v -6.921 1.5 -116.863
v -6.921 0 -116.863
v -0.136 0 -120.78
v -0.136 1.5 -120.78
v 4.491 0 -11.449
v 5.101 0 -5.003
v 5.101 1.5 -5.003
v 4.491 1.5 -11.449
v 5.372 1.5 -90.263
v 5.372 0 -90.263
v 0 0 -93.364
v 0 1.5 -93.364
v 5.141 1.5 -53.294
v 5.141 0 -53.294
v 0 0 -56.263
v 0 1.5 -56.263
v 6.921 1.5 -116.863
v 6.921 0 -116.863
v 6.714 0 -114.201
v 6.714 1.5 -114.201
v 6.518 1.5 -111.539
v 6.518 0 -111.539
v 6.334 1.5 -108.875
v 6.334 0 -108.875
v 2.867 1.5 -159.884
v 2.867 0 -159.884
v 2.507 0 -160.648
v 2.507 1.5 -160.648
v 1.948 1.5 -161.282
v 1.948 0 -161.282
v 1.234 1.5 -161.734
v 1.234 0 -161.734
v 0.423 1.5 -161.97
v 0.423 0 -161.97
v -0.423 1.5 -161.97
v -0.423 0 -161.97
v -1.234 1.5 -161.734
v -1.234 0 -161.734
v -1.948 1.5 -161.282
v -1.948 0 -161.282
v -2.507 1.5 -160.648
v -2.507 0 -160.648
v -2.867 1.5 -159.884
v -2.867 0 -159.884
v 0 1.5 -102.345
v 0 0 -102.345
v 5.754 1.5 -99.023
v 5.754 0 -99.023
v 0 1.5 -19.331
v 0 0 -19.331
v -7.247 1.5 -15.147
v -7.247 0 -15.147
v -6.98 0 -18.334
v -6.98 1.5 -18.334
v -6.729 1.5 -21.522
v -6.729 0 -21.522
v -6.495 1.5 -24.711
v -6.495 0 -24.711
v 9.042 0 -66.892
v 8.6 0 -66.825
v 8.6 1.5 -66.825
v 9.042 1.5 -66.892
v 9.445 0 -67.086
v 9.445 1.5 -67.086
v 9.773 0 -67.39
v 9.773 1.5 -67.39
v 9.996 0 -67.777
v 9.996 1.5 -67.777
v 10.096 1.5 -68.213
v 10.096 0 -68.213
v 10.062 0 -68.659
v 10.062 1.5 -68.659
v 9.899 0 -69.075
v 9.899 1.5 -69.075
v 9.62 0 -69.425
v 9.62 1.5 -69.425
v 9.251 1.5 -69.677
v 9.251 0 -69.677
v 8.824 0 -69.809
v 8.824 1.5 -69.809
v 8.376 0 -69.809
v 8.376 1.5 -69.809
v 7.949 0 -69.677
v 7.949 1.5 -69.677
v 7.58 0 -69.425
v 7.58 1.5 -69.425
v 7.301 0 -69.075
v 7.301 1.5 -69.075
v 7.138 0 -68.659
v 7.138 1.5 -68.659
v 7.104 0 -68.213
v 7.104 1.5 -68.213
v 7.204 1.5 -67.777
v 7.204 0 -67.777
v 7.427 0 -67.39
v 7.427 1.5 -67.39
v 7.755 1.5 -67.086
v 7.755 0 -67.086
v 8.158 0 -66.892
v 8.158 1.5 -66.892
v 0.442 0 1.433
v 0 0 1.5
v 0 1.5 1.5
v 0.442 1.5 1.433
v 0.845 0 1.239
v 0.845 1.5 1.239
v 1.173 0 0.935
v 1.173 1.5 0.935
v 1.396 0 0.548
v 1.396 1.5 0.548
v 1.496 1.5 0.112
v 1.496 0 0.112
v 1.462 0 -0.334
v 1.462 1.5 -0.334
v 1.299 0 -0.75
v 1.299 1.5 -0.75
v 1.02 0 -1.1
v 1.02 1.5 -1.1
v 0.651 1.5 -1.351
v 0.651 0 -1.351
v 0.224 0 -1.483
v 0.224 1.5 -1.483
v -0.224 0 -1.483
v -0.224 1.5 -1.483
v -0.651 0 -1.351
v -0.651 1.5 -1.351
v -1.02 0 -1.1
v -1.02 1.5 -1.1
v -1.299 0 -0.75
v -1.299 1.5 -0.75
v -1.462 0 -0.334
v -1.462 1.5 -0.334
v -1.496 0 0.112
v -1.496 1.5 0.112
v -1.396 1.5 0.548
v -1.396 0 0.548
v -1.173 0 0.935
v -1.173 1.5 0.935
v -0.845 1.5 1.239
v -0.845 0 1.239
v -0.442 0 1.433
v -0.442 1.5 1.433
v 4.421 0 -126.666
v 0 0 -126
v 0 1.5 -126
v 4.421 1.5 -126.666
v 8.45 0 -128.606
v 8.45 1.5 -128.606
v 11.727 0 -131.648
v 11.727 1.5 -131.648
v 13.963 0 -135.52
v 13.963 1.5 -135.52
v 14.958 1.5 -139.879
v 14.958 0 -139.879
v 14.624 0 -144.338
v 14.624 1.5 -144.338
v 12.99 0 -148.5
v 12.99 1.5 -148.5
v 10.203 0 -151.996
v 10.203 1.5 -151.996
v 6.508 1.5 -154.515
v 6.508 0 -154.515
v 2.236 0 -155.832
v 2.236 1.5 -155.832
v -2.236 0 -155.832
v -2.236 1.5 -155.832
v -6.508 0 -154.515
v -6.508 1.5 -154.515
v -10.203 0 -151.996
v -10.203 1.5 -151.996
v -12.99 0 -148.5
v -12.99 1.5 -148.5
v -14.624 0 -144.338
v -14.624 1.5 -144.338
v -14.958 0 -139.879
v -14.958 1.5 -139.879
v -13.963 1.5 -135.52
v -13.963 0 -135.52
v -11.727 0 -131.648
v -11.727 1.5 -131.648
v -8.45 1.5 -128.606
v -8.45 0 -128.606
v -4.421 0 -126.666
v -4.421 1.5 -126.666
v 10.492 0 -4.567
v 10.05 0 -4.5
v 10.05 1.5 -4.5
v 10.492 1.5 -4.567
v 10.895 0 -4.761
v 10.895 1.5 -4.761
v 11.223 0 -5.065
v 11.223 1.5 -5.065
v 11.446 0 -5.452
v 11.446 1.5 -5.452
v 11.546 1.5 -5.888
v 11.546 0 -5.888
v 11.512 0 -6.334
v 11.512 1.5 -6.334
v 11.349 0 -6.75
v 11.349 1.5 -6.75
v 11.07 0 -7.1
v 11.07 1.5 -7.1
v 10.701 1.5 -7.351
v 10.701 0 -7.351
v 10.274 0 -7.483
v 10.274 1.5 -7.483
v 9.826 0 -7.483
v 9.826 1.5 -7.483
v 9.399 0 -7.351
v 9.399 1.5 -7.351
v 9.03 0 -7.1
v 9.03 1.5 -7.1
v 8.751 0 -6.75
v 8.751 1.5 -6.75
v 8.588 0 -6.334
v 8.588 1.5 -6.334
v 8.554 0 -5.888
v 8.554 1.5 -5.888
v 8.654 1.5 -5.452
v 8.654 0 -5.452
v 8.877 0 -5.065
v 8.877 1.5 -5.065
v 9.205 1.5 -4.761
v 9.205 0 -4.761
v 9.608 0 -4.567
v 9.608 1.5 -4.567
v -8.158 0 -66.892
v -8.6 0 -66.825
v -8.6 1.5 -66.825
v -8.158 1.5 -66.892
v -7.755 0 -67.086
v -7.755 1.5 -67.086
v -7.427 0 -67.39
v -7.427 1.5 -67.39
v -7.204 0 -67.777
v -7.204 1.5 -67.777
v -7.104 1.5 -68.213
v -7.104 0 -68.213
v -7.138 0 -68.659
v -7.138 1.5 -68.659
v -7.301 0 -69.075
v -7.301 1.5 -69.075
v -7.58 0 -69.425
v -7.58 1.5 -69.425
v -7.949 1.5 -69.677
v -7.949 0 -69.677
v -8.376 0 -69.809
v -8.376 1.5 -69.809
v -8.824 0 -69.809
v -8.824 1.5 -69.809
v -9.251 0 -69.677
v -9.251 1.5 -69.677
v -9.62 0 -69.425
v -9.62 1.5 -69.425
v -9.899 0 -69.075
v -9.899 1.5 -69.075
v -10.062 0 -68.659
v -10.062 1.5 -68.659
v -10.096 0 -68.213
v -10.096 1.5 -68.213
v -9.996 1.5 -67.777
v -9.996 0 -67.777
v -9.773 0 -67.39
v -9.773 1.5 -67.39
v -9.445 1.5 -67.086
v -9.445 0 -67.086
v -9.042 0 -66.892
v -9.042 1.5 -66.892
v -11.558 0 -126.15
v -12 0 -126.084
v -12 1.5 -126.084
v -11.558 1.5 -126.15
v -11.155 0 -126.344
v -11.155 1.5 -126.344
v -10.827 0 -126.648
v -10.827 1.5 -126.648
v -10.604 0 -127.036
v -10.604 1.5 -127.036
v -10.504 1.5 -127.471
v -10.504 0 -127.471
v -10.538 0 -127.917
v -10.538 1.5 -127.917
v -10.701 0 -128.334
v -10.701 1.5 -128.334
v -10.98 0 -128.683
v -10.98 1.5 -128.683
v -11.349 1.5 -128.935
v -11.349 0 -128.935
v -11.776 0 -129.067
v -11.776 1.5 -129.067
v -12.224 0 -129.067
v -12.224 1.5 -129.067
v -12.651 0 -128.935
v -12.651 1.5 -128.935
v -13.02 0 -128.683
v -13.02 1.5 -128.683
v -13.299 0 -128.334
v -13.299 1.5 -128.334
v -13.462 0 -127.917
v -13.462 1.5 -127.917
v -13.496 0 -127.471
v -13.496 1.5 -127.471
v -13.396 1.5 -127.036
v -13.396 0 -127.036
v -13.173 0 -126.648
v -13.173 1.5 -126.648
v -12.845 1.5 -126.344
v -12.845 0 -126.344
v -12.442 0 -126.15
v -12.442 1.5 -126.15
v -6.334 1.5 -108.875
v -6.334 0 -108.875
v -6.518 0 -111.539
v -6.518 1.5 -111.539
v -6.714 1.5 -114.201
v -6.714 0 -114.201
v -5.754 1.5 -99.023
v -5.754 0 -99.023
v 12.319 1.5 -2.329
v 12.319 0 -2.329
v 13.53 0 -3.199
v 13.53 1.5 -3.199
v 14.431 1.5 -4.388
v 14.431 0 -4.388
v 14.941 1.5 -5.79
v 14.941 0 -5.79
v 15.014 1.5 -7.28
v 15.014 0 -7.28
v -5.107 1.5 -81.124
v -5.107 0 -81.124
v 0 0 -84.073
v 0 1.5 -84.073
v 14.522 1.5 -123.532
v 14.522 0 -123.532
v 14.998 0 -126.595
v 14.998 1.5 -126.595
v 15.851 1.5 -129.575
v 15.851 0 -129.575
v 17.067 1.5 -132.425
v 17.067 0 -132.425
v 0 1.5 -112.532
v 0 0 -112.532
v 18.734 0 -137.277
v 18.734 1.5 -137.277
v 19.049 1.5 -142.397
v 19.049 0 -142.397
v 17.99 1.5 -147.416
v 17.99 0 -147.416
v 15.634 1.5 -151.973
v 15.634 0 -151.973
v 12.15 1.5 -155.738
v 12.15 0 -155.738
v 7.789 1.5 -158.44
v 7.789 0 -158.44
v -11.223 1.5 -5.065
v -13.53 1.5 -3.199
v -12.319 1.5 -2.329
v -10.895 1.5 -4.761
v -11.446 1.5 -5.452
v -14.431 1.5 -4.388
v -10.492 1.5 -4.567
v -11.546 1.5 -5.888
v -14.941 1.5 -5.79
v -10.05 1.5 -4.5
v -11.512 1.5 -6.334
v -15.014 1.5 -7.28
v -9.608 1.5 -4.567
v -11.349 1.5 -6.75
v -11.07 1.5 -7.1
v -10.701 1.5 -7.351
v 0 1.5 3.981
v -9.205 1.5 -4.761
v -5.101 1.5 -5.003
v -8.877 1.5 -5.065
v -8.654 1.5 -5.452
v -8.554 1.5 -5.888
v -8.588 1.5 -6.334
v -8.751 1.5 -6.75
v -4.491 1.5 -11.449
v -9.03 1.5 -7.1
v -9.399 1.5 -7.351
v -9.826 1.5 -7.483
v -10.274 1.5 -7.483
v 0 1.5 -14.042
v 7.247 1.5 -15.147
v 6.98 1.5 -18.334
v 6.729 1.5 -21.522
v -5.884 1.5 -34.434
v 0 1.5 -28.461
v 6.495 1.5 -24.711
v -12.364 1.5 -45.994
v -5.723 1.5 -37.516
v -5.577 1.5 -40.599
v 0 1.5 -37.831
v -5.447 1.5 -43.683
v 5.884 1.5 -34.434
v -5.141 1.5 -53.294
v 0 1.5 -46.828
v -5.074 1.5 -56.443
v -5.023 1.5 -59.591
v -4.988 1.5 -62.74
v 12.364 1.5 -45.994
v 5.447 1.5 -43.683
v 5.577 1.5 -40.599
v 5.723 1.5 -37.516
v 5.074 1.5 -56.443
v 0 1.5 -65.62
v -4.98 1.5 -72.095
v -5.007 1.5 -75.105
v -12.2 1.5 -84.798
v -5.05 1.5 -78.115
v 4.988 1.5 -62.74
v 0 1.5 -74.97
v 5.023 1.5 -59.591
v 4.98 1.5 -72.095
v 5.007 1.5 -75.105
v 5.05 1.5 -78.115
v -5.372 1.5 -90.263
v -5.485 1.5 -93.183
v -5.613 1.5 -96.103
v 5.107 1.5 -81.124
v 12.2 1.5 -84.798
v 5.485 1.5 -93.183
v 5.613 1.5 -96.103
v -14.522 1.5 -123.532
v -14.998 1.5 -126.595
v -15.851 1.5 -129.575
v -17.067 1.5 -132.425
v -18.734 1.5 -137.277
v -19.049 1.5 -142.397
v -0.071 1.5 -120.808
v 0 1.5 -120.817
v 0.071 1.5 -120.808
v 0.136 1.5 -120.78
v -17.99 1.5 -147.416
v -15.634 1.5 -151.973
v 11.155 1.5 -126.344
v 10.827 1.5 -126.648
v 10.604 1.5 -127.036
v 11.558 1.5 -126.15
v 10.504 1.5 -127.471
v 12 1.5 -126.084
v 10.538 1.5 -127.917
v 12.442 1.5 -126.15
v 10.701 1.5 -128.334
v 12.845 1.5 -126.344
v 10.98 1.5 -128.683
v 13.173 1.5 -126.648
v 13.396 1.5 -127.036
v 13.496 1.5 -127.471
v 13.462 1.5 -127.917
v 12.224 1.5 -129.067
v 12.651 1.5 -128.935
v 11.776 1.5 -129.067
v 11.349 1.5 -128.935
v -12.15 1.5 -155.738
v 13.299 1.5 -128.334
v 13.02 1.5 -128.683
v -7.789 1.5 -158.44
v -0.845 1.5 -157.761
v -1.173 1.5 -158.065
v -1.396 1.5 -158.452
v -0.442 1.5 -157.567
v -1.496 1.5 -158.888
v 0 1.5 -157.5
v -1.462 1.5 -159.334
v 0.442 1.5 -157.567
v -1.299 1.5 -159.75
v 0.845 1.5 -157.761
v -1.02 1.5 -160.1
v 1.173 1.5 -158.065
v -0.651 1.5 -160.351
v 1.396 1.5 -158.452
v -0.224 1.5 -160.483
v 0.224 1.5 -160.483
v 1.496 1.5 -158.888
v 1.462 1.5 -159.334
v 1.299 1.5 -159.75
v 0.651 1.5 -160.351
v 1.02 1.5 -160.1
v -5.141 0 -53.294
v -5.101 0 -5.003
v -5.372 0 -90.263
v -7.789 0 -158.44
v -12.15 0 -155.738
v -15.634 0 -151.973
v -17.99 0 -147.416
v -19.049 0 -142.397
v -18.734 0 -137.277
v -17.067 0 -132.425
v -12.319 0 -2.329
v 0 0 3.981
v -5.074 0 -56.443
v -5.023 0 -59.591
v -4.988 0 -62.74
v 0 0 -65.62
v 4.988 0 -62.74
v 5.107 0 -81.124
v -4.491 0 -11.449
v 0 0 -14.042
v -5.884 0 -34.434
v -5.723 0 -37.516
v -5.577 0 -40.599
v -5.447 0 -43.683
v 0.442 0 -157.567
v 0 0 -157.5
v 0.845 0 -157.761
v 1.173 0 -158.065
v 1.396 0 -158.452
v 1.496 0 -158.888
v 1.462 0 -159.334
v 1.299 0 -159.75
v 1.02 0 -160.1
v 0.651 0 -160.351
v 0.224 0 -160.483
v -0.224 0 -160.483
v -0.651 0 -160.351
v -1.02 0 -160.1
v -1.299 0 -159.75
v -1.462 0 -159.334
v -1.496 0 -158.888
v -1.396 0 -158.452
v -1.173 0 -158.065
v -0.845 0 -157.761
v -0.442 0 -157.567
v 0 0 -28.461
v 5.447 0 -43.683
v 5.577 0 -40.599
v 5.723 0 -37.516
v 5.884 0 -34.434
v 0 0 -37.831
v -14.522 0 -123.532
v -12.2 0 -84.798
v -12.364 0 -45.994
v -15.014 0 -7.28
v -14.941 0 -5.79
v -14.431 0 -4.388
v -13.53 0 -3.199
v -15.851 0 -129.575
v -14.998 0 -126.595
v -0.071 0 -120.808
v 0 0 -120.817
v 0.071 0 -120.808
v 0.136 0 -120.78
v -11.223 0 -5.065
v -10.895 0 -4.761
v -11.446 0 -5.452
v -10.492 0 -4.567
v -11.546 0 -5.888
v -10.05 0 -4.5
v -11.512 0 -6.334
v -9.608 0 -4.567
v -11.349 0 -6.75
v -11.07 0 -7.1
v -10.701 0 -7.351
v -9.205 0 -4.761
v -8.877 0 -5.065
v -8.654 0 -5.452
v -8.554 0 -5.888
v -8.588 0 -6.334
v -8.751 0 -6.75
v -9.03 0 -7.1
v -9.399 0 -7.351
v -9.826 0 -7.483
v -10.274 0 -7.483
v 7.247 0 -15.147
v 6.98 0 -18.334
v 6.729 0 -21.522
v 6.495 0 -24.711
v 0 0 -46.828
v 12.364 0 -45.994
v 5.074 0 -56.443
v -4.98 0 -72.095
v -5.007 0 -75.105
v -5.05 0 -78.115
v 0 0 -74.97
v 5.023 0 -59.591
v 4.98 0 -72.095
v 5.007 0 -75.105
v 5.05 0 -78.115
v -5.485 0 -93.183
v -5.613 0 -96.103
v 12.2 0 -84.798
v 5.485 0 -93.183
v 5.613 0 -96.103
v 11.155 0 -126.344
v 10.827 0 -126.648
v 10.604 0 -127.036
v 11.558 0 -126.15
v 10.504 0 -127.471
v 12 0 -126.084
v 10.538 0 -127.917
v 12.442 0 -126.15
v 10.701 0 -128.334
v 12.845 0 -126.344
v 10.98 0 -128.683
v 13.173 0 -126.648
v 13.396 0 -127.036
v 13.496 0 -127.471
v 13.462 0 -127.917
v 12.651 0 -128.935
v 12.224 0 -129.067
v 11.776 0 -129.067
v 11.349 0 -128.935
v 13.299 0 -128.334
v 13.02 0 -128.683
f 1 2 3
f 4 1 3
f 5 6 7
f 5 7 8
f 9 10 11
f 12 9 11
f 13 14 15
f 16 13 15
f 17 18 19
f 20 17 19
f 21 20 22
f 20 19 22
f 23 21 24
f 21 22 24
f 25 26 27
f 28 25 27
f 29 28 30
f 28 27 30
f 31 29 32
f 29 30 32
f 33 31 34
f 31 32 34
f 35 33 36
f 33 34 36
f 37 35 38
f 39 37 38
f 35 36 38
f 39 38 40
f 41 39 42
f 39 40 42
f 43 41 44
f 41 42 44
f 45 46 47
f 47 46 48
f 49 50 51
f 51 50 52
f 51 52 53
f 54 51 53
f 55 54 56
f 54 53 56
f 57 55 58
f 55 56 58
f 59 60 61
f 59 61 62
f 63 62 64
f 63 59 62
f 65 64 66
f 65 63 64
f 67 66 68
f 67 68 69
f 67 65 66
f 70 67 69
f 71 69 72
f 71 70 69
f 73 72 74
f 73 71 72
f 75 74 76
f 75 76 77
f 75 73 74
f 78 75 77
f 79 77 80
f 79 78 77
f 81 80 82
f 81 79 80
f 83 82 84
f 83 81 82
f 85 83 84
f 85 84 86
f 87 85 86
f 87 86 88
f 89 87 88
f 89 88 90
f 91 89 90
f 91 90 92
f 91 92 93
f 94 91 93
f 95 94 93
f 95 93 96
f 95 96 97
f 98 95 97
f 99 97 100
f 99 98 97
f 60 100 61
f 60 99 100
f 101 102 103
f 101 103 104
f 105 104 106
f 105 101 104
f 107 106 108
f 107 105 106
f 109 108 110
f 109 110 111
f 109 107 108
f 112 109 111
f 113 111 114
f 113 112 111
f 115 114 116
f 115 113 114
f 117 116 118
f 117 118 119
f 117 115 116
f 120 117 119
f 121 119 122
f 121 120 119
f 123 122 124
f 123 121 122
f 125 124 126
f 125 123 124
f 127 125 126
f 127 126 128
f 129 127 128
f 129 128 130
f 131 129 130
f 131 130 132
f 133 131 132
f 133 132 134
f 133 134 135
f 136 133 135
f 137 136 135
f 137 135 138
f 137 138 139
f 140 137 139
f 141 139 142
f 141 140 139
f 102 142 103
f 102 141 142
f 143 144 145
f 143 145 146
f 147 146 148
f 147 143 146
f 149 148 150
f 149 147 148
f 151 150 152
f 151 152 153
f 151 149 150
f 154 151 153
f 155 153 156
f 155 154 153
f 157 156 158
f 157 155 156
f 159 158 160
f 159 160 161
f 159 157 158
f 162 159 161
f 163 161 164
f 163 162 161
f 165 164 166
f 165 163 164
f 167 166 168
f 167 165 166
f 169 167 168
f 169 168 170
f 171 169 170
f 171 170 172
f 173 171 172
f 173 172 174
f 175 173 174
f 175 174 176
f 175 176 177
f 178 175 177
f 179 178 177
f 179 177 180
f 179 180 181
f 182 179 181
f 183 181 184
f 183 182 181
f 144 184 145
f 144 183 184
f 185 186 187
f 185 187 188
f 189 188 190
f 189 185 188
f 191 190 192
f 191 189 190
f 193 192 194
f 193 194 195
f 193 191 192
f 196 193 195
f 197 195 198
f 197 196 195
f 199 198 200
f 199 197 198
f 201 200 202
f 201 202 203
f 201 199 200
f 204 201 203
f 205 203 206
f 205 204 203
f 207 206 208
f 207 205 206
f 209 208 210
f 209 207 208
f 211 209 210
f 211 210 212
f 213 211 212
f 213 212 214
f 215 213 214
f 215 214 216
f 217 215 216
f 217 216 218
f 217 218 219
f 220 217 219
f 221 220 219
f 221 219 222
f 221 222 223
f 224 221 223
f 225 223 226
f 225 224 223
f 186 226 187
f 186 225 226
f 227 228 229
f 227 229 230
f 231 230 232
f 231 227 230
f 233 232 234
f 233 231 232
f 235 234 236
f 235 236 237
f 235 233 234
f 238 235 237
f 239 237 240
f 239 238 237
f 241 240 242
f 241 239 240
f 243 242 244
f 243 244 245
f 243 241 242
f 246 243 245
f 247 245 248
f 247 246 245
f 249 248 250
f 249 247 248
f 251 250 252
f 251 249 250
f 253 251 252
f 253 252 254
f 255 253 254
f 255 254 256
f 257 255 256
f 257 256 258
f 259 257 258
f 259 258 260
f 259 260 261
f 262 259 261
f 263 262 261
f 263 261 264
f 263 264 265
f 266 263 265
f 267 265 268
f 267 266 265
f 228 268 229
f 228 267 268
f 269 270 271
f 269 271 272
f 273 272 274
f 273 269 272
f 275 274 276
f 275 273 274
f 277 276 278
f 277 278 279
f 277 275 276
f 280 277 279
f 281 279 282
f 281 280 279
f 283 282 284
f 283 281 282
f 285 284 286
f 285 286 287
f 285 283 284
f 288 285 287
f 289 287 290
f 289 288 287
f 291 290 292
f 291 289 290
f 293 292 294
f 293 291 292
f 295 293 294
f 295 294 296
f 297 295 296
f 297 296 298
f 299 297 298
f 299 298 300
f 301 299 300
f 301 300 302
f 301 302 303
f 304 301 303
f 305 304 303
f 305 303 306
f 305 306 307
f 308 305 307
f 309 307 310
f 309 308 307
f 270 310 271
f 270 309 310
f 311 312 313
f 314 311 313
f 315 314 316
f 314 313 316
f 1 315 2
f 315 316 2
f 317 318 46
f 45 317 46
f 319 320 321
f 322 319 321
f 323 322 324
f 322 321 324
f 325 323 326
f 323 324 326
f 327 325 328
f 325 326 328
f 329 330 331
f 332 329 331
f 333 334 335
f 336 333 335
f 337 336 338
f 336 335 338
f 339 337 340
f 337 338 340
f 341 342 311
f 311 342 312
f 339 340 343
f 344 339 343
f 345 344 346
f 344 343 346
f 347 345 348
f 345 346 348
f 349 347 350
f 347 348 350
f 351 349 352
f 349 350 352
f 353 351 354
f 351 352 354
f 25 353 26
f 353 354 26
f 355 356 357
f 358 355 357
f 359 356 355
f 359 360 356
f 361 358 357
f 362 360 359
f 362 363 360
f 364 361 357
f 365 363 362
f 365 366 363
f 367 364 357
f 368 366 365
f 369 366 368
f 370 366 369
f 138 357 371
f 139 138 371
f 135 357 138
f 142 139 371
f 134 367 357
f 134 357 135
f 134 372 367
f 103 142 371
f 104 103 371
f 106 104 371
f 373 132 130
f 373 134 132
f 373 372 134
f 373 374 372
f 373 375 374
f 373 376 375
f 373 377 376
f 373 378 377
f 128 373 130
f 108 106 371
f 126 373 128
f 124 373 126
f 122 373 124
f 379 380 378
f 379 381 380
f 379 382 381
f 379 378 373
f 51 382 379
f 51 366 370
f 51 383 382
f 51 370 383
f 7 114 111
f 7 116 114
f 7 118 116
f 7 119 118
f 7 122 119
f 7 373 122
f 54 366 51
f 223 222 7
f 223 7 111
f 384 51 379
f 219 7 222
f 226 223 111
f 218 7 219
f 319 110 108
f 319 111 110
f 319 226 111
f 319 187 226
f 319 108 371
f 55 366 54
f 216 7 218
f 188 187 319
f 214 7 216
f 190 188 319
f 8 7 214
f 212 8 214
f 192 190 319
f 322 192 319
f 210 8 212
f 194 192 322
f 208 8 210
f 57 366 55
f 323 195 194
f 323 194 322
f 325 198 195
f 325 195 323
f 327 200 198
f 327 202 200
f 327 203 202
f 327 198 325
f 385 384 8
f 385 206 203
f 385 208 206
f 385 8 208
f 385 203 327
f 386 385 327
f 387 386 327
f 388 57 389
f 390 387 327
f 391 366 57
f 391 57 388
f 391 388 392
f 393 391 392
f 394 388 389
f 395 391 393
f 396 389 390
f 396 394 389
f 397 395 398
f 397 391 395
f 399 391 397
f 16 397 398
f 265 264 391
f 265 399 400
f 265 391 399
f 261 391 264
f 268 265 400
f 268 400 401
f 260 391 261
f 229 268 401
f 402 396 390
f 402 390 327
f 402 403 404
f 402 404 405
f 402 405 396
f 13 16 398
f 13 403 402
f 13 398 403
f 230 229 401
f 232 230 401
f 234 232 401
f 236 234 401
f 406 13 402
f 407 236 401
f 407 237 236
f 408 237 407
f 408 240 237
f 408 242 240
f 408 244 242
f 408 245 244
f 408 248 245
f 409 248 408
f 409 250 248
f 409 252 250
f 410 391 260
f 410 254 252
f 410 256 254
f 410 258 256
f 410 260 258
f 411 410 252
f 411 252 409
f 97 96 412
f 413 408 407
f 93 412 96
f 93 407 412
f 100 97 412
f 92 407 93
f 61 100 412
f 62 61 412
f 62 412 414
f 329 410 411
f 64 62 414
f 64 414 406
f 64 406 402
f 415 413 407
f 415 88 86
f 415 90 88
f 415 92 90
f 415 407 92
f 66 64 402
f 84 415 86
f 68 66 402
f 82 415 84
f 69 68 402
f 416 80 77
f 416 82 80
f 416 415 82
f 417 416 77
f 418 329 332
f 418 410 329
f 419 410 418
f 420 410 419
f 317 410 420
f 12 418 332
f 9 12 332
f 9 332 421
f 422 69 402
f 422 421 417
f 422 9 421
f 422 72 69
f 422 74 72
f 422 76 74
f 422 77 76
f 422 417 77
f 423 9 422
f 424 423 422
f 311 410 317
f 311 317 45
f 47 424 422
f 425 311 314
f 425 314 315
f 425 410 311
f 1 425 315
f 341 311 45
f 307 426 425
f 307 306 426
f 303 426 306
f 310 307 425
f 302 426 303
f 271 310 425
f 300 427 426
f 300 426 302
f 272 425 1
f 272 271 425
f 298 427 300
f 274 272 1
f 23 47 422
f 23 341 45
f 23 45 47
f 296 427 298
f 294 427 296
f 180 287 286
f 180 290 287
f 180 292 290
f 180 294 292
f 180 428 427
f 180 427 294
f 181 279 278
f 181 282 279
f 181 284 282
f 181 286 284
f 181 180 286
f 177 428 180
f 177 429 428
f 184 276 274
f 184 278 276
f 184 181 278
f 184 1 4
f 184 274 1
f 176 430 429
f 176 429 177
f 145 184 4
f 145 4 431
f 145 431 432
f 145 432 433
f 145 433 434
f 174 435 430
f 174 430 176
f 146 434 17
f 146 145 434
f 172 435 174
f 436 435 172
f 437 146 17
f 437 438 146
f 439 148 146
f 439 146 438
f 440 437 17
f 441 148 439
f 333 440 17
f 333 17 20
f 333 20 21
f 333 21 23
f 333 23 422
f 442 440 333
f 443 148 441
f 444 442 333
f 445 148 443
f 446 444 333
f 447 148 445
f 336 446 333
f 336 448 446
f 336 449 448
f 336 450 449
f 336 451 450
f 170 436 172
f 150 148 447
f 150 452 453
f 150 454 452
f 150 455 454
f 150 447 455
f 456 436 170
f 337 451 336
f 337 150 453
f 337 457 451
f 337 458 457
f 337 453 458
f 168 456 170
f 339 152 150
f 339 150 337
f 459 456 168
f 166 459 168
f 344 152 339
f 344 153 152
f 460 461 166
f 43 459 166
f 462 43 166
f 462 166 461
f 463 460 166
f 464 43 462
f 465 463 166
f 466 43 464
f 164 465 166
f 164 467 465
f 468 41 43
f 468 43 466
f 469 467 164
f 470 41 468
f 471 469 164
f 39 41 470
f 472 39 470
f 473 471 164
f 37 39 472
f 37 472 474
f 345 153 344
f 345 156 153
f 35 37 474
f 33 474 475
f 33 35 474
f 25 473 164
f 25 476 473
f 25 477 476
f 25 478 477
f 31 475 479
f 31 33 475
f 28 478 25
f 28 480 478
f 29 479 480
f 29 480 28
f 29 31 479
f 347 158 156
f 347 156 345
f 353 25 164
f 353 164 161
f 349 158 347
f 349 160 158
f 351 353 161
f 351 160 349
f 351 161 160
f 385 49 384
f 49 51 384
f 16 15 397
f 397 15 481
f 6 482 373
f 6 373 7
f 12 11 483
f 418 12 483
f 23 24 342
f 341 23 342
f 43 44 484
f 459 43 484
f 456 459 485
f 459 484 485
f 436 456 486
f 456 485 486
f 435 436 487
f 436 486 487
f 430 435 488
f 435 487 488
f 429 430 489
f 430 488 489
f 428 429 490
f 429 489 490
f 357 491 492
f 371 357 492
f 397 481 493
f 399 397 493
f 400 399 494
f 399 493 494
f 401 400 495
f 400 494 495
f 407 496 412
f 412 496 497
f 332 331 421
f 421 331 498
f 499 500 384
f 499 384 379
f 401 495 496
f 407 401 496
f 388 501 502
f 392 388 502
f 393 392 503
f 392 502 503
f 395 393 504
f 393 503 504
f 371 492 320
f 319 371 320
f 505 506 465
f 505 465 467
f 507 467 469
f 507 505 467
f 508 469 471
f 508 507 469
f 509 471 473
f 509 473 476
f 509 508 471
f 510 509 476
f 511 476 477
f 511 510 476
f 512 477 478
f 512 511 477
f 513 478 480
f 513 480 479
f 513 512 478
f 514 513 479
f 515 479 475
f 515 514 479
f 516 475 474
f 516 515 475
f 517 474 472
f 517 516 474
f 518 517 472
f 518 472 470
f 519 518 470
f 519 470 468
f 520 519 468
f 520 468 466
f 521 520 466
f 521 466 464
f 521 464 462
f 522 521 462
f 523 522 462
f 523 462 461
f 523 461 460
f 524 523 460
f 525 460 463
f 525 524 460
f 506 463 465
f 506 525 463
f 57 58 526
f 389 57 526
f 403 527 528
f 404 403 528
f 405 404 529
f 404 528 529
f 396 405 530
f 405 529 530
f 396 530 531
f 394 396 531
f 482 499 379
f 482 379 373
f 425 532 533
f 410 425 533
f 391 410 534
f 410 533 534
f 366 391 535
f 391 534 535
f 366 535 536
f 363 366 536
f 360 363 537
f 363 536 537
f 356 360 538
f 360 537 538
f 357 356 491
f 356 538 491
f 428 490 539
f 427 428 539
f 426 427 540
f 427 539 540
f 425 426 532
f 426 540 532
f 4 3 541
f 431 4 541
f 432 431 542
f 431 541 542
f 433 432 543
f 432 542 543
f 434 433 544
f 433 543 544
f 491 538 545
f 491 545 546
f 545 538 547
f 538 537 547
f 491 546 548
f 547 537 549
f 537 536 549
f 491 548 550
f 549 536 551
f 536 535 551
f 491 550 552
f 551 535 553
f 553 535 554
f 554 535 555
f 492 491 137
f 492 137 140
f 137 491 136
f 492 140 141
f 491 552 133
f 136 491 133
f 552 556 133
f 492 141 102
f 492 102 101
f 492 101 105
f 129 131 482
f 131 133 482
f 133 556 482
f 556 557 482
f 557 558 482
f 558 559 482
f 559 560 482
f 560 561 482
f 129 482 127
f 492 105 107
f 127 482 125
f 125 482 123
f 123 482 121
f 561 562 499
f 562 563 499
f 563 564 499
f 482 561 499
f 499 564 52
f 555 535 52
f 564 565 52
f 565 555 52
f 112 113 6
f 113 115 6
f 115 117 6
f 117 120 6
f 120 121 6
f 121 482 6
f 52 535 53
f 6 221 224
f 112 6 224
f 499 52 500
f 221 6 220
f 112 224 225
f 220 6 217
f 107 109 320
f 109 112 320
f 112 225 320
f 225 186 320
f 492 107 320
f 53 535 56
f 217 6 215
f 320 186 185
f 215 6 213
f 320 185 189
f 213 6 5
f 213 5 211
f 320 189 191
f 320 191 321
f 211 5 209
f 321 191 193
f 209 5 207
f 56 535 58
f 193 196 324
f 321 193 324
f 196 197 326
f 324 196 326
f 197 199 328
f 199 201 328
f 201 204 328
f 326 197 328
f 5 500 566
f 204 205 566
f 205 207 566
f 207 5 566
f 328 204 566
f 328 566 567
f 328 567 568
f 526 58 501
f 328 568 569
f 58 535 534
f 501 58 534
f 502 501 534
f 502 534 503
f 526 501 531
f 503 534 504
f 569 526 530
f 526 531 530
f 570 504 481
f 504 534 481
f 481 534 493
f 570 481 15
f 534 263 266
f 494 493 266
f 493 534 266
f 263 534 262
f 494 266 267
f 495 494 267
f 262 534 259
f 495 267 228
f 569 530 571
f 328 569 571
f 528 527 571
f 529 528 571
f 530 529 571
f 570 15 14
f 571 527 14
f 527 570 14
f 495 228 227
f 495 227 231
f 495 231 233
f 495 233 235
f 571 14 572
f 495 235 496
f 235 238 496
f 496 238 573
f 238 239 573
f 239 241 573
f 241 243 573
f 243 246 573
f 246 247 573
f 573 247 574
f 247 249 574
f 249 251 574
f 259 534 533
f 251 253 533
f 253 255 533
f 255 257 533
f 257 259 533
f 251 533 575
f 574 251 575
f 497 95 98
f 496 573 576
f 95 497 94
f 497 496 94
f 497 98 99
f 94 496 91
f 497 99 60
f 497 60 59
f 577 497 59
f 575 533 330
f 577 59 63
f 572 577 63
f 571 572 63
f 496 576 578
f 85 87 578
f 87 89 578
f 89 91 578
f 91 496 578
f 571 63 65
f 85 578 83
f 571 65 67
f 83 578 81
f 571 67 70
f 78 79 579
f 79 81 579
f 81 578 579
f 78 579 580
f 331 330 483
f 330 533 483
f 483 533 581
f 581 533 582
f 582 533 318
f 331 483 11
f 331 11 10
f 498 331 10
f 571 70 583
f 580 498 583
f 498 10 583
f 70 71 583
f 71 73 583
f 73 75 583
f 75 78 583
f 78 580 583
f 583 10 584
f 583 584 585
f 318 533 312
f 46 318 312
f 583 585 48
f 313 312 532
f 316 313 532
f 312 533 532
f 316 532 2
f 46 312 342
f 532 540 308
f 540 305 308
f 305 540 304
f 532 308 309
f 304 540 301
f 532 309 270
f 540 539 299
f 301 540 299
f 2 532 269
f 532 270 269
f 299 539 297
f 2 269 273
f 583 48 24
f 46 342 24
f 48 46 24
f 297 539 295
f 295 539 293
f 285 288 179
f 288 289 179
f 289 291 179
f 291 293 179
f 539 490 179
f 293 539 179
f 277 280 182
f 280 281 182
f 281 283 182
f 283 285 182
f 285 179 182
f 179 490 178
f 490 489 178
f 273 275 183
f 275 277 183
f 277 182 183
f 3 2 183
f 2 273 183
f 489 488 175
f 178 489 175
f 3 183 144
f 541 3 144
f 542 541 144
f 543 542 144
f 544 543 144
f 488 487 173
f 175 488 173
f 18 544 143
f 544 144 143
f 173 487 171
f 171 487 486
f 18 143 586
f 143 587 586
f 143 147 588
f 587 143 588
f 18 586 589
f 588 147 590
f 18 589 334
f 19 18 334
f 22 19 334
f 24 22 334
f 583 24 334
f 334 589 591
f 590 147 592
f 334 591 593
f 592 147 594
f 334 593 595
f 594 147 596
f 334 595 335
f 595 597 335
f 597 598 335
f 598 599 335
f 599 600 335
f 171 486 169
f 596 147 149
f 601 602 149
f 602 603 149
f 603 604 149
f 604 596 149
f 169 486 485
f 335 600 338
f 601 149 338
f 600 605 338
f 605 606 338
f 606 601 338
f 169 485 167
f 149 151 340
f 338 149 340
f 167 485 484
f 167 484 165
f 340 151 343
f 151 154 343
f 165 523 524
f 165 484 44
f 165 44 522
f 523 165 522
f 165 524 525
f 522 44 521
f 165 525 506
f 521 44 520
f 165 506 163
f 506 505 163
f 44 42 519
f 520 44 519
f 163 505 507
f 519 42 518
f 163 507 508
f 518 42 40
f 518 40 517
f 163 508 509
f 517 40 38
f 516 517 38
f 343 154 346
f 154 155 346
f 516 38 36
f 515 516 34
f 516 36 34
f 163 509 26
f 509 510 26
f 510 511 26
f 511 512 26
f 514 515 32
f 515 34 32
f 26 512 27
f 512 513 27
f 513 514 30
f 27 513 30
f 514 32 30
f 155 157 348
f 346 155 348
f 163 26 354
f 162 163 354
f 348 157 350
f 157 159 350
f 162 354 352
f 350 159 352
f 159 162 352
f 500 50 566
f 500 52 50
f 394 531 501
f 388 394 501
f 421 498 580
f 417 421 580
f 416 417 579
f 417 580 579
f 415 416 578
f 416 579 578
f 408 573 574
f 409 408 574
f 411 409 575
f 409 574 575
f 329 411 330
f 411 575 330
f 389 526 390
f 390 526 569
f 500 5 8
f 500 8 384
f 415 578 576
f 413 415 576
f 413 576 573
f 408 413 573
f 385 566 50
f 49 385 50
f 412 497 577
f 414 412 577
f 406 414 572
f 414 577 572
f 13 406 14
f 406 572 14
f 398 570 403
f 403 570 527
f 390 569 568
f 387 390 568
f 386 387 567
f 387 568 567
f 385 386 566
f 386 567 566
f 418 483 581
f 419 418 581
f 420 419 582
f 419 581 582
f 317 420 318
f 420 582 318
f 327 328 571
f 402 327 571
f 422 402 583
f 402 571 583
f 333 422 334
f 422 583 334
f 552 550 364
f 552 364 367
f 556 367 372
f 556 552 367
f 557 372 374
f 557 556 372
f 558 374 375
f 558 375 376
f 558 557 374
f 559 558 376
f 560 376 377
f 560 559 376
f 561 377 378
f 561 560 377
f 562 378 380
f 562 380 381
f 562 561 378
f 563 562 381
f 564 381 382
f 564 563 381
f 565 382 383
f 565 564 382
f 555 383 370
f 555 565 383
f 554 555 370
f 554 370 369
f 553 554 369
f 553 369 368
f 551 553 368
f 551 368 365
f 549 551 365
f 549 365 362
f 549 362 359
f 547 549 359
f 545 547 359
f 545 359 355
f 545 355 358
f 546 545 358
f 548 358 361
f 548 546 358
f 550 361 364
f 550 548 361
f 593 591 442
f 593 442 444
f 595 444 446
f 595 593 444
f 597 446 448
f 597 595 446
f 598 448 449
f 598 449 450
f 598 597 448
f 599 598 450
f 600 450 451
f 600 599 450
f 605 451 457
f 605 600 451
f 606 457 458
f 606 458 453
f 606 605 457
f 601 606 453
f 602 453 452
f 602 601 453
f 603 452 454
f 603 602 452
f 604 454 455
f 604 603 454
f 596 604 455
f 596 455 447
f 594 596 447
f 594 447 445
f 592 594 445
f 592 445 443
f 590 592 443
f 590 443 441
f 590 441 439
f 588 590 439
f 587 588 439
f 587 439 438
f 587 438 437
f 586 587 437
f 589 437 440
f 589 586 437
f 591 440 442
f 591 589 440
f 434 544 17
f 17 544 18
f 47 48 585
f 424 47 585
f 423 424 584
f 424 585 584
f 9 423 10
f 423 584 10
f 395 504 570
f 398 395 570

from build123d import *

# Parameters (mm, degrees)
SKETCH_1_R      = 1.5
SKETCH_1_R_2    = 15
EXTRUDE_1_DEPTH = 1.5


with BuildPart() as part:
    # 草圖1 → 填料-伸長1 (new body)
    with BuildSketch(Plane(origin=(0, 0, 0), x_dir=(1, 0, 0), z_dir=(0, 1, 0))):
        with BuildLine():
            Line((0, -3.980931511), (12.319060855, 2.328849967))
            ThreePointArc((12.319060855, 2.328849967), (14.431141465, 4.388450613), (15.014493405, 7.28025625))
            ThreePointArc((15.014493405, 7.28025625), (11.971039141, 65.394509034), (14.52184689, 123.53246884))
            ThreePointArc((14.52184689, 123.53246884), (15.377876917, 128.098069479), (17.067022361, 132.425226083))
            ThreePointArc((17.067022361, 132.425226083), (16.965589985, 149.77375384), (2.866920195, 159.883611111))
            ThreePointArc((2.866920195, 159.883611111), (0, 162), (-2.866920195, 159.883611111))
            ThreePointArc((-2.866920195, 159.883611111), (-16.965589985, 149.77375384), (-17.067022361, 132.425226083))
            ThreePointArc((-17.067022361, 132.425226083), (-15.377876917, 128.098069479), (-14.52184689, 123.53246884))
            ThreePointArc((-14.52184689, 123.53246884), (-11.971039141, 65.394509034), (-15.014493405, 7.28025625))
            ThreePointArc((-15.014493405, 7.28025625), (-14.431141465, 4.388450613), (-12.319060855, 2.328849967))
            Line((-12.319060855, 2.328849967), (0, -3.980931511))
        make_face()
        with Locations(Location((-12, 127.583592135, 0), (0, 0, 270))):
            Circle(SKETCH_1_R, mode=Mode.SUBTRACT)
        with Locations(Location((12, 127.583592135, 0), (0, 0, 270))):
            Circle(SKETCH_1_R, mode=Mode.SUBTRACT)
        with Locations(Location((8.6, 68.325395665, 0), (0, 0, 270))):
            Circle(SKETCH_1_R, mode=Mode.SUBTRACT)
        with Locations(Location((-8.6, 68.325395665, 0), (0, 0, 270))):
            Circle(SKETCH_1_R, mode=Mode.SUBTRACT)
        with Locations(Location((10.05, 6, 0), (0, 0, 270))):
            Circle(SKETCH_1_R, mode=Mode.SUBTRACT)
        with Locations(Location((-10.05, 6, 0), (0, 0, 270))):
            Circle(SKETCH_1_R, mode=Mode.SUBTRACT)
        with Locations(Location((0, 159, 0), (0, 0, 270))):
            Circle(SKETCH_1_R, mode=Mode.SUBTRACT)
        with Locations(Location((0, 0, 0), (0, 0, 270))):
            Circle(SKETCH_1_R, mode=Mode.SUBTRACT)
        with Locations(Location((0, 141, 0), (0, 0, 270))):
            Circle(SKETCH_1_R_2, mode=Mode.SUBTRACT)
        Polygon((0, 14.042409585), (-4.491071946, 11.449487988), (-5.101164168, 5.002829556), (5.101164168, 5.002829556), (4.491071946, 11.449487988), align=None, mode=Mode.SUBTRACT)
        with BuildLine():
            Line((0, 112.532142135), (-6.334048162, 108.875177723))
            ThreePointArc((-6.334048162, 108.875177723), (-6.614696141, 112.870067669), (-6.92146425, 116.863036776))
            Line((-6.92146425, 116.863036776), (-0.136378432, 120.780407899))
            ThreePointArc((-0.136378432, 120.780407899), (0, 120.816950389), (0.136378432, 120.780407899))
            Line((0.136378432, 120.780407899), (6.92146425, 116.863036776))
            ThreePointArc((6.92146425, 116.863036776), (6.614696141, 112.870067669), (6.334048162, 108.875177723))
            Line((6.334048162, 108.875177723), (0, 112.532142135))
        make_face(mode=Mode.SUBTRACT)
        with BuildLine():
            Line((0, 102.344922167), (5.753985291, 99.02285721))
            ThreePointArc((5.753985291, 99.02285721), (5.547257407, 94.643430297), (5.371890331, 90.262635518))
            Line((5.371890331, 90.262635518), (0, 93.364097846))
            Line((0, 93.364097846), (-5.371890331, 90.262635518))
            ThreePointArc((-5.371890331, 90.262635518), (-5.547257407, 94.643430297), (-5.753985291, 99.02285721))
            Line((-5.753985291, 99.02285721), (0, 102.344922167))
        make_face(mode=Mode.SUBTRACT)
        with BuildLine():
            Line((0, 84.072725452), (5.10712289, 81.124126676))
            ThreePointArc((5.10712289, 81.124126676), (5.026699976, 76.609736924), (4.97956534, 72.094876904))
            Line((4.97956534, 72.094876904), (0, 74.969830293))
            Line((0, 74.969830293), (-4.97956534, 72.094876904))
            ThreePointArc((-4.97956534, 72.094876904), (-5.026699976, 76.609736924), (-5.10712289, 81.124126676))
            Line((-5.10712289, 81.124126676), (0, 84.072725452))
        make_face(mode=Mode.SUBTRACT)
        with BuildLine():
            Line((0, 65.619773758), (4.987851065, 62.740036603))
            ThreePointArc((4.987851065, 62.740036603), (5.046332025, 58.016878131), (5.141244155, 53.29431128))
            Line((5.141244155, 53.29431128), (0, 56.262609977))
            Line((0, 56.262609977), (-5.141244155, 53.29431128))
            ThreePointArc((-5.141244155, 53.29431128), (-5.046332025, 58.016878131), (-4.987851065, 62.740036603))
            Line((-4.987851065, 62.740036603), (0, 65.619773758))
        make_face(mode=Mode.SUBTRACT)
        with BuildLine():
            Line((0, 46.827706802), (5.447027498, 43.68286401))
            ThreePointArc((5.447027498, 43.68286401), (5.648052955, 39.057684109), (5.884040018, 34.434156186))
            Line((5.884040018, 34.434156186), (0, 37.831308275))
            Line((0, 37.831308275), (-5.884040018, 34.434156186))
            ThreePointArc((-5.884040018, 34.434156186), (-5.648052955, 39.057684109), (-5.447027498, 43.68286401))
            Line((-5.447027498, 43.68286401), (0, 46.827706802))
        make_face(mode=Mode.SUBTRACT)
        with BuildLine():
            Line((0, 28.460830008), (6.494782795, 24.711065414))
            ThreePointArc((6.494782795, 24.711065414), (6.852315766, 19.927479382), (7.247310233, 15.146840877))
            Line((7.247310233, 15.146840877), (0, 19.331077391))
            Line((0, 19.331077391), (-7.247310233, 15.146840877))
            ThreePointArc((-7.247310233, 15.146840877), (-6.852315766, 19.927479382), (-6.494782795, 24.711065414))
            Line((-6.494782795, 24.711065414), (0, 28.460830008))
        make_face(mode=Mode.SUBTRACT)
    extrude(amount=EXTRUDE_1_DEPTH)


solid = part.part
